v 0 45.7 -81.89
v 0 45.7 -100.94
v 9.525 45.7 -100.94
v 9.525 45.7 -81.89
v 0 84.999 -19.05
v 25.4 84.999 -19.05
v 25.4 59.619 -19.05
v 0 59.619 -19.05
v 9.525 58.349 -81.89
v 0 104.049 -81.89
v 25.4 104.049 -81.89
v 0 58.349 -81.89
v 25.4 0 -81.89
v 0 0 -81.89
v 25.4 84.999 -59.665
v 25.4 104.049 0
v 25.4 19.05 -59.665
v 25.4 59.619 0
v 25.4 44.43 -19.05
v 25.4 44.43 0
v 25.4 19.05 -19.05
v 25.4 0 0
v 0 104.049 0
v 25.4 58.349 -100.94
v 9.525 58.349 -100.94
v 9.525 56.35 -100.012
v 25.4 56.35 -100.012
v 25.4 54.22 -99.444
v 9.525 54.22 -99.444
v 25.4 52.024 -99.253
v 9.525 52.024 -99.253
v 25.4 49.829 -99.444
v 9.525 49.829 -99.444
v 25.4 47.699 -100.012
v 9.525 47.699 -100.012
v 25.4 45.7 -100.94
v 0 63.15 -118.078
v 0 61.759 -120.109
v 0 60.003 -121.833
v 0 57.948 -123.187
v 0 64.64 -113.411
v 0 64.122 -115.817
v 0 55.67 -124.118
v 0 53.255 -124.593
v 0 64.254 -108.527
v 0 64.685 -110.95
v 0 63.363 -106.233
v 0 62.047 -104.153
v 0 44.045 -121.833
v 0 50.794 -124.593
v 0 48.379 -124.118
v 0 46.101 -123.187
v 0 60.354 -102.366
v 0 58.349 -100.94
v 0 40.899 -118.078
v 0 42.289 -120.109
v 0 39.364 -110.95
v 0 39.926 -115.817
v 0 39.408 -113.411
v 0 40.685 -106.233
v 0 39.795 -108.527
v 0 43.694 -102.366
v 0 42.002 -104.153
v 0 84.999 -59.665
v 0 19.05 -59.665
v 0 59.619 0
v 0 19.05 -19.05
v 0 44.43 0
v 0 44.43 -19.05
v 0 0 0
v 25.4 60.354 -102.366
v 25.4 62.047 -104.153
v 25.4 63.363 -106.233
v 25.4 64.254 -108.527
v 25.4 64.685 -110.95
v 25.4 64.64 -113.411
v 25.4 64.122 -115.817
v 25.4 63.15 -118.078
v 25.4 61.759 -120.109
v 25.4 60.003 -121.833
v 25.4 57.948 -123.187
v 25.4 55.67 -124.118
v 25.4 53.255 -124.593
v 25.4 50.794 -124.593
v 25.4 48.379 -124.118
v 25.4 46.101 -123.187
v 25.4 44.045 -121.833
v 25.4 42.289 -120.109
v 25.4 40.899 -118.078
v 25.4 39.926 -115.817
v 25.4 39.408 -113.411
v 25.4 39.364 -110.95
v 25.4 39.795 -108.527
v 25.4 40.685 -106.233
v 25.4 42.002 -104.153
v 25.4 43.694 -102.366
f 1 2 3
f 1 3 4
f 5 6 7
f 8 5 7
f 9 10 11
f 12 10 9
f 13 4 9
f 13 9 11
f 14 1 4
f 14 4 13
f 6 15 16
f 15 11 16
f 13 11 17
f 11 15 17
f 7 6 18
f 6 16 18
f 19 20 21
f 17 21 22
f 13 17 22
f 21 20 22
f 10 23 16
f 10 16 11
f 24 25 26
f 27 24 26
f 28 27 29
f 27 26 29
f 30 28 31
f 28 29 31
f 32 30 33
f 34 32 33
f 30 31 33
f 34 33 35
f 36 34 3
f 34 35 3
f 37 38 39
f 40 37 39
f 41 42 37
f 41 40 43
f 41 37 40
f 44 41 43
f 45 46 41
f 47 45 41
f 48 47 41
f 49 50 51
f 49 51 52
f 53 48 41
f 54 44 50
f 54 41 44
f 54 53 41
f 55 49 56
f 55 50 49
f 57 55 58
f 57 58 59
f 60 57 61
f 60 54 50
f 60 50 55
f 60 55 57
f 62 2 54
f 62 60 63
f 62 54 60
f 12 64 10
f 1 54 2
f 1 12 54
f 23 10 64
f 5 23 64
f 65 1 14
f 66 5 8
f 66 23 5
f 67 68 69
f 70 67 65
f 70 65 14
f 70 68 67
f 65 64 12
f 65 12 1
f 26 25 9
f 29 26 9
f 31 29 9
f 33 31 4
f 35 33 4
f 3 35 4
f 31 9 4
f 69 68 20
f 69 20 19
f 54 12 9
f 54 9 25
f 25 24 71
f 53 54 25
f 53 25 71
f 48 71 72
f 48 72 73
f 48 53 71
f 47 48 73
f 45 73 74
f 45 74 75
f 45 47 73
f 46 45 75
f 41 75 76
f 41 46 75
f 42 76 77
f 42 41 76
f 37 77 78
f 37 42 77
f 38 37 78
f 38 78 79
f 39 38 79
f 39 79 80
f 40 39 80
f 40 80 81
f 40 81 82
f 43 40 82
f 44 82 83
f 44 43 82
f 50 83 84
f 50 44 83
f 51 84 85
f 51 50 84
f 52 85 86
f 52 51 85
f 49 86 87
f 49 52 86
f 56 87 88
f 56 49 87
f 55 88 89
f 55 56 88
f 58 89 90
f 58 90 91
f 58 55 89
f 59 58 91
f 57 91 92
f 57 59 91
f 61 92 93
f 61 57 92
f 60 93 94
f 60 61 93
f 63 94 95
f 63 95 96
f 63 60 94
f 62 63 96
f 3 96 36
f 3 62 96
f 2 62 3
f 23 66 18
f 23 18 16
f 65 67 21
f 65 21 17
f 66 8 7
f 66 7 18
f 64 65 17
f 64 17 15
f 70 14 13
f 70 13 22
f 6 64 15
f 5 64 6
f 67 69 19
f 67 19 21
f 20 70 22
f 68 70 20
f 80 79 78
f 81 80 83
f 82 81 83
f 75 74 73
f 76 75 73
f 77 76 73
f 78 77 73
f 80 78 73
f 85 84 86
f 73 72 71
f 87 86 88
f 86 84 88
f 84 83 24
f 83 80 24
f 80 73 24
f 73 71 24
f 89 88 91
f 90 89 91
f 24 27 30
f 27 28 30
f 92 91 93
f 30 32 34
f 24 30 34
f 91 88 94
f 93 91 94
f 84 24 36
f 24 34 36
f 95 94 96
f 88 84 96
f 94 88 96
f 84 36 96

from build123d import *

# Parameters (mm, degrees)
BOSS_EXTRUDE1_DEPTH = 25.4
CUT_EXTRUDE1_START  = -15.875
CUT_EXTRUDE1_DEPTH  = 15.875


with BuildPart() as part:
    # Sketch1 → Boss-Extrude1 (new body)
    with BuildSketch(Plane.YZ):
        with BuildLine():
            Line((0, 0), (44.42968, 0))
            Line((44.42968, 0), (44.42968, -19.05))
            Line((44.42968, -19.05), (19.05, -19.05))
            Line((19.05, -19.05), (19.05, -59.6646))
            Line((19.05, -59.6646), (84.99856, -59.6646))
            Line((84.99856, -59.6646), (84.99856, -19.05))
            Line((84.99856, -19.05), (59.61888, -19.05))
            Line((59.61888, -19.05), (59.61888, 0))
            Line((59.61888, 0), (104.04856, 0))
            Line((104.04856, 0), (104.04856, -81.8896))
            Line((104.04856, -81.8896), (58.34888, -81.8896))
            Line((58.34888, -81.8896), (58.34888, -100.9396))
            ThreePointArc((58.34888, -100.9396), (52.02428, -124.652748271), (45.69968, -100.9396))
            Line((45.69968, -100.9396), (45.69968, -81.8896))
            Line((45.69968, -81.8896), (0, -81.8896))
            Line((0, -81.8896), (0, 0))
        make_face()
    extrude(amount=BOSS_EXTRUDE1_DEPTH)

    # Sketch2 → Cut-Extrude1 (cut)
    with BuildSketch(Plane.YZ.offset(25.4).offset(CUT_EXTRUDE1_START)):
        with BuildLine():
            Line((45.69968, -81.8896), (58.34888, -81.8896))
            Line((58.34888, -81.8896), (58.34888, -100.9396))
            ThreePointArc((58.34888, -100.9396), (52.02428, -99.252748271), (45.69968, -100.9396))
            Line((45.69968, -100.9396), (45.69968, -81.8896))
        make_face()
    extrude(amount=CUT_EXTRUDE1_DEPTH, mode=Mode.SUBTRACT)


solid = part.part
